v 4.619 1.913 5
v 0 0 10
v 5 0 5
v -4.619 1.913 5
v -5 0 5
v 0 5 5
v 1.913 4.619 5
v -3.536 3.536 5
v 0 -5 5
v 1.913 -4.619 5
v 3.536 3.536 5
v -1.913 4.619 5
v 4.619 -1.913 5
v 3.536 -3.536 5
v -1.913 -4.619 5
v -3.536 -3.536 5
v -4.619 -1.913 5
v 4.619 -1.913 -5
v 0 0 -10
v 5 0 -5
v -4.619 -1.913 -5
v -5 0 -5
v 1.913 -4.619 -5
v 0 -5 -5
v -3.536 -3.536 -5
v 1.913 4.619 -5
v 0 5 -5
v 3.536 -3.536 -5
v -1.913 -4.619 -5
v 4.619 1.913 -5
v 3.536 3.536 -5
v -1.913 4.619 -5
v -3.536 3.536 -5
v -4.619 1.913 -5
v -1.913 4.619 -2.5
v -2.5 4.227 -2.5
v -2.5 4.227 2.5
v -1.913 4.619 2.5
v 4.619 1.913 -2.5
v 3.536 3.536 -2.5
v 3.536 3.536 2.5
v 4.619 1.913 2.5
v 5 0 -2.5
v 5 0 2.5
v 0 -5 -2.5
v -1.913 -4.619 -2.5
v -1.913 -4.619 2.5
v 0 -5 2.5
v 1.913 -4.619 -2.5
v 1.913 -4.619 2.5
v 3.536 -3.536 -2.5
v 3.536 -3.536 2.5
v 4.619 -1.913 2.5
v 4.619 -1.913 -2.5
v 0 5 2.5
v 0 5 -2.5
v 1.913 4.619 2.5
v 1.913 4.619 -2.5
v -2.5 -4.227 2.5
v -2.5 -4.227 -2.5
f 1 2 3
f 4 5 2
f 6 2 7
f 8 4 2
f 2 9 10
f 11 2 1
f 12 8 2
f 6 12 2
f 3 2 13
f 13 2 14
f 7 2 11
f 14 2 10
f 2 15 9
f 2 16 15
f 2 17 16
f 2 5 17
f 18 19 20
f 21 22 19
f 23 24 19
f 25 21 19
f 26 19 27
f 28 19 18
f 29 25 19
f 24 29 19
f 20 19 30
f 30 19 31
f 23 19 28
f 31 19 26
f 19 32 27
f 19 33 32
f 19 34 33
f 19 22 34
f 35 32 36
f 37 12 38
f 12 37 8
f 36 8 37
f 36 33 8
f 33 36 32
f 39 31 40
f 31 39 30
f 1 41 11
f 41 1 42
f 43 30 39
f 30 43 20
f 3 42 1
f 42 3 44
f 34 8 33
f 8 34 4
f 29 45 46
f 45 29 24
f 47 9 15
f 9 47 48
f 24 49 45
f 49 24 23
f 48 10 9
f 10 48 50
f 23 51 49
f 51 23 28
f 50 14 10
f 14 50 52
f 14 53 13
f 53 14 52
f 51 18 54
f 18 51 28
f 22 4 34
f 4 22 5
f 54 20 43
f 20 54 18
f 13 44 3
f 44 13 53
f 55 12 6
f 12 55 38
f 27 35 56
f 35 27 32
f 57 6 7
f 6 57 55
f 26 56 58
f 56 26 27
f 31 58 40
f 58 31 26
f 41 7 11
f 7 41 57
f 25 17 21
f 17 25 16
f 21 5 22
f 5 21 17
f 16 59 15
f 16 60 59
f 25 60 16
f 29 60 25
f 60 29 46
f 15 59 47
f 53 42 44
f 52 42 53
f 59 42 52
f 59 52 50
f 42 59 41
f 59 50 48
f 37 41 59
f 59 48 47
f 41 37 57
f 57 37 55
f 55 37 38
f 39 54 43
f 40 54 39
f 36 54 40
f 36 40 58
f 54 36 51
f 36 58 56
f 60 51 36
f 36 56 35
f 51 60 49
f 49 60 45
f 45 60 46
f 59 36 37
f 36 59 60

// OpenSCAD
jointLength = 10;
jointRadius = 5;
coneLength = 5;
jointHoleLength = 5;
jointConnectionThickness = jointRadius * 0.5;
resolution = 16;

difference() {

    union() {

        translate(v = [ 0, 0, jointLength * 0.5 ])
            cylinder(h = coneLength, r1 = jointRadius, r2 = 0, center=false);

        translate(v = [ 0, 0, -jointLength * 0.5 ])
            rotate(a = [ 180, 0, 0 ])
                cylinder(h = coneLength, r1 = jointRadius, r2 = 0, center=false);

        cylinder(r1 = jointRadius, r2 = jointRadius, h = jointLength, center=true);

    };

    translate(v = [ jointConnectionThickness, 0, 0 ])
        cube(size = [ jointRadius * 2, jointHoleLength * 2, jointHoleLength ], center=true);

};
